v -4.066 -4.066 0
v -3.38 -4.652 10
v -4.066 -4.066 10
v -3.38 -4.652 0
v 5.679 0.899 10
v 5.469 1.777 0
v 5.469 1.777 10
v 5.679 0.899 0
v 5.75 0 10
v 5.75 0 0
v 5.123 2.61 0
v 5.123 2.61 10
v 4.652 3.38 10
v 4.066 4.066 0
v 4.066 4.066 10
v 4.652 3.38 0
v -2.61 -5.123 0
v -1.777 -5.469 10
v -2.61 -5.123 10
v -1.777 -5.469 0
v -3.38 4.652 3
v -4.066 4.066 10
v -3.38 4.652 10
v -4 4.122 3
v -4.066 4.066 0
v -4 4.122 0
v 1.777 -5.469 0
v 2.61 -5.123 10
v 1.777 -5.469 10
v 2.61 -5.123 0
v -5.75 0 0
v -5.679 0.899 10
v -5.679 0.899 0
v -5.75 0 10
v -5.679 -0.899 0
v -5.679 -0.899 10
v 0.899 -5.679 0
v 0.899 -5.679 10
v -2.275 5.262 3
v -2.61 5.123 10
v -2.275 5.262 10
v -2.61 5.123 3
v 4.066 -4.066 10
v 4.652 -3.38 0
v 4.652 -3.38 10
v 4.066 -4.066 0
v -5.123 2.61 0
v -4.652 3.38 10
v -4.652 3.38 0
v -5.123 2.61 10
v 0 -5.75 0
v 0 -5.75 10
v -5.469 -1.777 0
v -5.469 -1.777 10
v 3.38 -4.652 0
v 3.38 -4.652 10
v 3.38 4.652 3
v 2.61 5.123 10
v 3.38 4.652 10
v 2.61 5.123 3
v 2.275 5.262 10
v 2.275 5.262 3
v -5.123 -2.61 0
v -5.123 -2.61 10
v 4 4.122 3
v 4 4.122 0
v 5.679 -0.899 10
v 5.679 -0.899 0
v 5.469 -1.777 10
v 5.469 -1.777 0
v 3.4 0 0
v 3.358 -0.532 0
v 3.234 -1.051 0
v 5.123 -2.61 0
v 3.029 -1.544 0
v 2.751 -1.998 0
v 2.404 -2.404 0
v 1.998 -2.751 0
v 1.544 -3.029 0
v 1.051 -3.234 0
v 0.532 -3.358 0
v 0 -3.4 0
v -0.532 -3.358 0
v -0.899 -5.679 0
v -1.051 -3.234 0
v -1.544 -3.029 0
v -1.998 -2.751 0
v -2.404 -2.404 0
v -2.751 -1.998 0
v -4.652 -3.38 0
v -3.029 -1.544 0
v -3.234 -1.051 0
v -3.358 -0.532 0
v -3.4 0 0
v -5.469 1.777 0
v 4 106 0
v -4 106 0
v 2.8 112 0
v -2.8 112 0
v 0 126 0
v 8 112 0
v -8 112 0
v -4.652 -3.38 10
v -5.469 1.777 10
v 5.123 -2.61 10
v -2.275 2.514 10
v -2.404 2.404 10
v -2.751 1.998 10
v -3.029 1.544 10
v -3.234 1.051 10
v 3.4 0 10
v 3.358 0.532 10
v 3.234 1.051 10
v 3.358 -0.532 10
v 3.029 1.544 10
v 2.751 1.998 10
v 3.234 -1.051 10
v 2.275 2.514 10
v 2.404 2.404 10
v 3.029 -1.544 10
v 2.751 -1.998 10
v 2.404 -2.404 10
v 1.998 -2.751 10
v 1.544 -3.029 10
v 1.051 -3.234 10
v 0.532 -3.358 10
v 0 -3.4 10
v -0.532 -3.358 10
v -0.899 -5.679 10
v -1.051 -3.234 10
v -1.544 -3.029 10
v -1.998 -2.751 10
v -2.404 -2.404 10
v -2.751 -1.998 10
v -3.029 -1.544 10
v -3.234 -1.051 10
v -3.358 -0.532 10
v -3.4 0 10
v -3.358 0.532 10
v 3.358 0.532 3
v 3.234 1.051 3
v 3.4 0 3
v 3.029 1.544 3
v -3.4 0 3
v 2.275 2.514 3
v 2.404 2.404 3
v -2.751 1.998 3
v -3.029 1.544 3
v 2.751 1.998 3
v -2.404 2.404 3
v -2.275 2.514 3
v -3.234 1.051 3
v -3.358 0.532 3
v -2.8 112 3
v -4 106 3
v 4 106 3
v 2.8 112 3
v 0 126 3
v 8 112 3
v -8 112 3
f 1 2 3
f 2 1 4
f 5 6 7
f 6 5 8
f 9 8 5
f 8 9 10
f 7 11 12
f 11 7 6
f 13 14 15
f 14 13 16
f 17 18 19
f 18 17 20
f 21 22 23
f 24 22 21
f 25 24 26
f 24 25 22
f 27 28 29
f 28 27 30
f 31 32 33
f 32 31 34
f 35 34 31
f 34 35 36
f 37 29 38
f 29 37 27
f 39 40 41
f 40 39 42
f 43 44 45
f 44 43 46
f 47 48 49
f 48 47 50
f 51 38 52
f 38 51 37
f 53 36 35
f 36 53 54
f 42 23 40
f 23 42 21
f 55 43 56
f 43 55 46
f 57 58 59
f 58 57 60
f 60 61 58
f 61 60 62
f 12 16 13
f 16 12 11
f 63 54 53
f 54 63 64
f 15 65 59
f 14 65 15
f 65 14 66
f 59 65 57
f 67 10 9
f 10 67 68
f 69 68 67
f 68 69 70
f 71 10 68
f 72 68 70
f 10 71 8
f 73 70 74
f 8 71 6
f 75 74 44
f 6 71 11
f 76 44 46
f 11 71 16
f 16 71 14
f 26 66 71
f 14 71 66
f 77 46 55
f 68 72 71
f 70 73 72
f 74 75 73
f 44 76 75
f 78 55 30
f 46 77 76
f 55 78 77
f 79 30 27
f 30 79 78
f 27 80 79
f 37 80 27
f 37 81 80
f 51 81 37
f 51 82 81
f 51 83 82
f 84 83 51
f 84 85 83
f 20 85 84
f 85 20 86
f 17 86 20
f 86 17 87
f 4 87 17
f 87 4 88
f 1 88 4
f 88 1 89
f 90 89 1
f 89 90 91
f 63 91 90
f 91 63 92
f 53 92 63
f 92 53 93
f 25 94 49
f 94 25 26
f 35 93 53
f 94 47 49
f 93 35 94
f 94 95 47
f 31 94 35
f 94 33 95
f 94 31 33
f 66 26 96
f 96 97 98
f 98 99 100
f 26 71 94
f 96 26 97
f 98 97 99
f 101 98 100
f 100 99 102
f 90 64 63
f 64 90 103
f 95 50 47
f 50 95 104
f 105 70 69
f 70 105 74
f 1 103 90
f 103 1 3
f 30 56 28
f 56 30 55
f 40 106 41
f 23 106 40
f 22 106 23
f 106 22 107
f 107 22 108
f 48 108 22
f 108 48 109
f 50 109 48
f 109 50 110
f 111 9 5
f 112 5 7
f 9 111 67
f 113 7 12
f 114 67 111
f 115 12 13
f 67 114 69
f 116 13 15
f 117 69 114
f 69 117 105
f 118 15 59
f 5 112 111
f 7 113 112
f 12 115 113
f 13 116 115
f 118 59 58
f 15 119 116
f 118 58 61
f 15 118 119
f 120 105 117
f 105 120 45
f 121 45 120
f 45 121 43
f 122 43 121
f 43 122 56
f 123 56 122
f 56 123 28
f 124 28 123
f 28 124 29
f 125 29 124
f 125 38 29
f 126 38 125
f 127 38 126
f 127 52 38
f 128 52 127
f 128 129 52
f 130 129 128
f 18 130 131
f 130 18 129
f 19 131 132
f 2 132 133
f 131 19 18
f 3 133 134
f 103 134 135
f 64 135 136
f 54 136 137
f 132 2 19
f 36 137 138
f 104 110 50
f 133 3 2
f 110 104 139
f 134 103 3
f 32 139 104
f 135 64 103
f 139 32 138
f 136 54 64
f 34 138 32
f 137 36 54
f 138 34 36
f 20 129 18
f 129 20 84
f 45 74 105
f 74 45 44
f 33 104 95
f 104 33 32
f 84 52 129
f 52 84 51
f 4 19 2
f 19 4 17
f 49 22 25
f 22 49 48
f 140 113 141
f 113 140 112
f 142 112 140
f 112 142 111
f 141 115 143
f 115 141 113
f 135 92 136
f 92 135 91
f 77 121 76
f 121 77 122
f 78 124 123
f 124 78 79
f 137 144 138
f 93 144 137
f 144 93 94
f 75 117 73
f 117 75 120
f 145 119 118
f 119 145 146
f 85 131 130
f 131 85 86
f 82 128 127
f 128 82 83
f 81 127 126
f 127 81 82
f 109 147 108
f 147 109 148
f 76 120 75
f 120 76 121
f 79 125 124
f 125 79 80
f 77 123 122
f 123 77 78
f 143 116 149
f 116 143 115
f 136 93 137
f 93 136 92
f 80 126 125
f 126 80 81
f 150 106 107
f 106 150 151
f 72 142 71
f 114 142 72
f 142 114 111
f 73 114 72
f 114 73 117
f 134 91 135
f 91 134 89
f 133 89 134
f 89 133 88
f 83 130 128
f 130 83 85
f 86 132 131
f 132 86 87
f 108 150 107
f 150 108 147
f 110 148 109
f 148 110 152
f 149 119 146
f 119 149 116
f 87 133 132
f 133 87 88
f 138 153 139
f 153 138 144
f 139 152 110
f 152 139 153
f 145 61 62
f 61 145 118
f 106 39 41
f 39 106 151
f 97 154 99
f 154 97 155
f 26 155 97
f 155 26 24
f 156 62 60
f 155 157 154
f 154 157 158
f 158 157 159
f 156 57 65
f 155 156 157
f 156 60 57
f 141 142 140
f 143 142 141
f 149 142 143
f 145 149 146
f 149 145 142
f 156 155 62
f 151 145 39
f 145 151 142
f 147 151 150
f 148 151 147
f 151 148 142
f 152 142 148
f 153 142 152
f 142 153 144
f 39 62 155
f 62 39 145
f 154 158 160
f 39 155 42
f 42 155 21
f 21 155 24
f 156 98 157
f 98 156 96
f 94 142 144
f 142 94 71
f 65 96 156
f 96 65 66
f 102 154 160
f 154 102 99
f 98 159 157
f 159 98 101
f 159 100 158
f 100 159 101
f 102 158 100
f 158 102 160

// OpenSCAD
// Ground stake that holds 1/4" (6-7 mm OD) drip tubing or a dripper. CC0.
tube_od = 6.5; len = 120;
$fn = 40;
linear_extrude(3) polygon([[-4, 0], [4, 0], [4, len - 14], [0, len + 6], [-4, len - 14]]);   // flat stake
translate([0, len - 8, 0]) rotate([0, 0, 0]) linear_extrude(3) polygon([[-8, 0], [8, 0], [0, 14]]);
difference() {
  translate([0, 0, 0]) cylinder(d = tube_od + 5, h = 10);
  translate([0, 0, -1]) cylinder(d = tube_od + 0.3, h = 12);
  translate([-tube_od * 0.35, 0, -1]) cube([tube_od * 0.7, tube_od, 12]);
}
